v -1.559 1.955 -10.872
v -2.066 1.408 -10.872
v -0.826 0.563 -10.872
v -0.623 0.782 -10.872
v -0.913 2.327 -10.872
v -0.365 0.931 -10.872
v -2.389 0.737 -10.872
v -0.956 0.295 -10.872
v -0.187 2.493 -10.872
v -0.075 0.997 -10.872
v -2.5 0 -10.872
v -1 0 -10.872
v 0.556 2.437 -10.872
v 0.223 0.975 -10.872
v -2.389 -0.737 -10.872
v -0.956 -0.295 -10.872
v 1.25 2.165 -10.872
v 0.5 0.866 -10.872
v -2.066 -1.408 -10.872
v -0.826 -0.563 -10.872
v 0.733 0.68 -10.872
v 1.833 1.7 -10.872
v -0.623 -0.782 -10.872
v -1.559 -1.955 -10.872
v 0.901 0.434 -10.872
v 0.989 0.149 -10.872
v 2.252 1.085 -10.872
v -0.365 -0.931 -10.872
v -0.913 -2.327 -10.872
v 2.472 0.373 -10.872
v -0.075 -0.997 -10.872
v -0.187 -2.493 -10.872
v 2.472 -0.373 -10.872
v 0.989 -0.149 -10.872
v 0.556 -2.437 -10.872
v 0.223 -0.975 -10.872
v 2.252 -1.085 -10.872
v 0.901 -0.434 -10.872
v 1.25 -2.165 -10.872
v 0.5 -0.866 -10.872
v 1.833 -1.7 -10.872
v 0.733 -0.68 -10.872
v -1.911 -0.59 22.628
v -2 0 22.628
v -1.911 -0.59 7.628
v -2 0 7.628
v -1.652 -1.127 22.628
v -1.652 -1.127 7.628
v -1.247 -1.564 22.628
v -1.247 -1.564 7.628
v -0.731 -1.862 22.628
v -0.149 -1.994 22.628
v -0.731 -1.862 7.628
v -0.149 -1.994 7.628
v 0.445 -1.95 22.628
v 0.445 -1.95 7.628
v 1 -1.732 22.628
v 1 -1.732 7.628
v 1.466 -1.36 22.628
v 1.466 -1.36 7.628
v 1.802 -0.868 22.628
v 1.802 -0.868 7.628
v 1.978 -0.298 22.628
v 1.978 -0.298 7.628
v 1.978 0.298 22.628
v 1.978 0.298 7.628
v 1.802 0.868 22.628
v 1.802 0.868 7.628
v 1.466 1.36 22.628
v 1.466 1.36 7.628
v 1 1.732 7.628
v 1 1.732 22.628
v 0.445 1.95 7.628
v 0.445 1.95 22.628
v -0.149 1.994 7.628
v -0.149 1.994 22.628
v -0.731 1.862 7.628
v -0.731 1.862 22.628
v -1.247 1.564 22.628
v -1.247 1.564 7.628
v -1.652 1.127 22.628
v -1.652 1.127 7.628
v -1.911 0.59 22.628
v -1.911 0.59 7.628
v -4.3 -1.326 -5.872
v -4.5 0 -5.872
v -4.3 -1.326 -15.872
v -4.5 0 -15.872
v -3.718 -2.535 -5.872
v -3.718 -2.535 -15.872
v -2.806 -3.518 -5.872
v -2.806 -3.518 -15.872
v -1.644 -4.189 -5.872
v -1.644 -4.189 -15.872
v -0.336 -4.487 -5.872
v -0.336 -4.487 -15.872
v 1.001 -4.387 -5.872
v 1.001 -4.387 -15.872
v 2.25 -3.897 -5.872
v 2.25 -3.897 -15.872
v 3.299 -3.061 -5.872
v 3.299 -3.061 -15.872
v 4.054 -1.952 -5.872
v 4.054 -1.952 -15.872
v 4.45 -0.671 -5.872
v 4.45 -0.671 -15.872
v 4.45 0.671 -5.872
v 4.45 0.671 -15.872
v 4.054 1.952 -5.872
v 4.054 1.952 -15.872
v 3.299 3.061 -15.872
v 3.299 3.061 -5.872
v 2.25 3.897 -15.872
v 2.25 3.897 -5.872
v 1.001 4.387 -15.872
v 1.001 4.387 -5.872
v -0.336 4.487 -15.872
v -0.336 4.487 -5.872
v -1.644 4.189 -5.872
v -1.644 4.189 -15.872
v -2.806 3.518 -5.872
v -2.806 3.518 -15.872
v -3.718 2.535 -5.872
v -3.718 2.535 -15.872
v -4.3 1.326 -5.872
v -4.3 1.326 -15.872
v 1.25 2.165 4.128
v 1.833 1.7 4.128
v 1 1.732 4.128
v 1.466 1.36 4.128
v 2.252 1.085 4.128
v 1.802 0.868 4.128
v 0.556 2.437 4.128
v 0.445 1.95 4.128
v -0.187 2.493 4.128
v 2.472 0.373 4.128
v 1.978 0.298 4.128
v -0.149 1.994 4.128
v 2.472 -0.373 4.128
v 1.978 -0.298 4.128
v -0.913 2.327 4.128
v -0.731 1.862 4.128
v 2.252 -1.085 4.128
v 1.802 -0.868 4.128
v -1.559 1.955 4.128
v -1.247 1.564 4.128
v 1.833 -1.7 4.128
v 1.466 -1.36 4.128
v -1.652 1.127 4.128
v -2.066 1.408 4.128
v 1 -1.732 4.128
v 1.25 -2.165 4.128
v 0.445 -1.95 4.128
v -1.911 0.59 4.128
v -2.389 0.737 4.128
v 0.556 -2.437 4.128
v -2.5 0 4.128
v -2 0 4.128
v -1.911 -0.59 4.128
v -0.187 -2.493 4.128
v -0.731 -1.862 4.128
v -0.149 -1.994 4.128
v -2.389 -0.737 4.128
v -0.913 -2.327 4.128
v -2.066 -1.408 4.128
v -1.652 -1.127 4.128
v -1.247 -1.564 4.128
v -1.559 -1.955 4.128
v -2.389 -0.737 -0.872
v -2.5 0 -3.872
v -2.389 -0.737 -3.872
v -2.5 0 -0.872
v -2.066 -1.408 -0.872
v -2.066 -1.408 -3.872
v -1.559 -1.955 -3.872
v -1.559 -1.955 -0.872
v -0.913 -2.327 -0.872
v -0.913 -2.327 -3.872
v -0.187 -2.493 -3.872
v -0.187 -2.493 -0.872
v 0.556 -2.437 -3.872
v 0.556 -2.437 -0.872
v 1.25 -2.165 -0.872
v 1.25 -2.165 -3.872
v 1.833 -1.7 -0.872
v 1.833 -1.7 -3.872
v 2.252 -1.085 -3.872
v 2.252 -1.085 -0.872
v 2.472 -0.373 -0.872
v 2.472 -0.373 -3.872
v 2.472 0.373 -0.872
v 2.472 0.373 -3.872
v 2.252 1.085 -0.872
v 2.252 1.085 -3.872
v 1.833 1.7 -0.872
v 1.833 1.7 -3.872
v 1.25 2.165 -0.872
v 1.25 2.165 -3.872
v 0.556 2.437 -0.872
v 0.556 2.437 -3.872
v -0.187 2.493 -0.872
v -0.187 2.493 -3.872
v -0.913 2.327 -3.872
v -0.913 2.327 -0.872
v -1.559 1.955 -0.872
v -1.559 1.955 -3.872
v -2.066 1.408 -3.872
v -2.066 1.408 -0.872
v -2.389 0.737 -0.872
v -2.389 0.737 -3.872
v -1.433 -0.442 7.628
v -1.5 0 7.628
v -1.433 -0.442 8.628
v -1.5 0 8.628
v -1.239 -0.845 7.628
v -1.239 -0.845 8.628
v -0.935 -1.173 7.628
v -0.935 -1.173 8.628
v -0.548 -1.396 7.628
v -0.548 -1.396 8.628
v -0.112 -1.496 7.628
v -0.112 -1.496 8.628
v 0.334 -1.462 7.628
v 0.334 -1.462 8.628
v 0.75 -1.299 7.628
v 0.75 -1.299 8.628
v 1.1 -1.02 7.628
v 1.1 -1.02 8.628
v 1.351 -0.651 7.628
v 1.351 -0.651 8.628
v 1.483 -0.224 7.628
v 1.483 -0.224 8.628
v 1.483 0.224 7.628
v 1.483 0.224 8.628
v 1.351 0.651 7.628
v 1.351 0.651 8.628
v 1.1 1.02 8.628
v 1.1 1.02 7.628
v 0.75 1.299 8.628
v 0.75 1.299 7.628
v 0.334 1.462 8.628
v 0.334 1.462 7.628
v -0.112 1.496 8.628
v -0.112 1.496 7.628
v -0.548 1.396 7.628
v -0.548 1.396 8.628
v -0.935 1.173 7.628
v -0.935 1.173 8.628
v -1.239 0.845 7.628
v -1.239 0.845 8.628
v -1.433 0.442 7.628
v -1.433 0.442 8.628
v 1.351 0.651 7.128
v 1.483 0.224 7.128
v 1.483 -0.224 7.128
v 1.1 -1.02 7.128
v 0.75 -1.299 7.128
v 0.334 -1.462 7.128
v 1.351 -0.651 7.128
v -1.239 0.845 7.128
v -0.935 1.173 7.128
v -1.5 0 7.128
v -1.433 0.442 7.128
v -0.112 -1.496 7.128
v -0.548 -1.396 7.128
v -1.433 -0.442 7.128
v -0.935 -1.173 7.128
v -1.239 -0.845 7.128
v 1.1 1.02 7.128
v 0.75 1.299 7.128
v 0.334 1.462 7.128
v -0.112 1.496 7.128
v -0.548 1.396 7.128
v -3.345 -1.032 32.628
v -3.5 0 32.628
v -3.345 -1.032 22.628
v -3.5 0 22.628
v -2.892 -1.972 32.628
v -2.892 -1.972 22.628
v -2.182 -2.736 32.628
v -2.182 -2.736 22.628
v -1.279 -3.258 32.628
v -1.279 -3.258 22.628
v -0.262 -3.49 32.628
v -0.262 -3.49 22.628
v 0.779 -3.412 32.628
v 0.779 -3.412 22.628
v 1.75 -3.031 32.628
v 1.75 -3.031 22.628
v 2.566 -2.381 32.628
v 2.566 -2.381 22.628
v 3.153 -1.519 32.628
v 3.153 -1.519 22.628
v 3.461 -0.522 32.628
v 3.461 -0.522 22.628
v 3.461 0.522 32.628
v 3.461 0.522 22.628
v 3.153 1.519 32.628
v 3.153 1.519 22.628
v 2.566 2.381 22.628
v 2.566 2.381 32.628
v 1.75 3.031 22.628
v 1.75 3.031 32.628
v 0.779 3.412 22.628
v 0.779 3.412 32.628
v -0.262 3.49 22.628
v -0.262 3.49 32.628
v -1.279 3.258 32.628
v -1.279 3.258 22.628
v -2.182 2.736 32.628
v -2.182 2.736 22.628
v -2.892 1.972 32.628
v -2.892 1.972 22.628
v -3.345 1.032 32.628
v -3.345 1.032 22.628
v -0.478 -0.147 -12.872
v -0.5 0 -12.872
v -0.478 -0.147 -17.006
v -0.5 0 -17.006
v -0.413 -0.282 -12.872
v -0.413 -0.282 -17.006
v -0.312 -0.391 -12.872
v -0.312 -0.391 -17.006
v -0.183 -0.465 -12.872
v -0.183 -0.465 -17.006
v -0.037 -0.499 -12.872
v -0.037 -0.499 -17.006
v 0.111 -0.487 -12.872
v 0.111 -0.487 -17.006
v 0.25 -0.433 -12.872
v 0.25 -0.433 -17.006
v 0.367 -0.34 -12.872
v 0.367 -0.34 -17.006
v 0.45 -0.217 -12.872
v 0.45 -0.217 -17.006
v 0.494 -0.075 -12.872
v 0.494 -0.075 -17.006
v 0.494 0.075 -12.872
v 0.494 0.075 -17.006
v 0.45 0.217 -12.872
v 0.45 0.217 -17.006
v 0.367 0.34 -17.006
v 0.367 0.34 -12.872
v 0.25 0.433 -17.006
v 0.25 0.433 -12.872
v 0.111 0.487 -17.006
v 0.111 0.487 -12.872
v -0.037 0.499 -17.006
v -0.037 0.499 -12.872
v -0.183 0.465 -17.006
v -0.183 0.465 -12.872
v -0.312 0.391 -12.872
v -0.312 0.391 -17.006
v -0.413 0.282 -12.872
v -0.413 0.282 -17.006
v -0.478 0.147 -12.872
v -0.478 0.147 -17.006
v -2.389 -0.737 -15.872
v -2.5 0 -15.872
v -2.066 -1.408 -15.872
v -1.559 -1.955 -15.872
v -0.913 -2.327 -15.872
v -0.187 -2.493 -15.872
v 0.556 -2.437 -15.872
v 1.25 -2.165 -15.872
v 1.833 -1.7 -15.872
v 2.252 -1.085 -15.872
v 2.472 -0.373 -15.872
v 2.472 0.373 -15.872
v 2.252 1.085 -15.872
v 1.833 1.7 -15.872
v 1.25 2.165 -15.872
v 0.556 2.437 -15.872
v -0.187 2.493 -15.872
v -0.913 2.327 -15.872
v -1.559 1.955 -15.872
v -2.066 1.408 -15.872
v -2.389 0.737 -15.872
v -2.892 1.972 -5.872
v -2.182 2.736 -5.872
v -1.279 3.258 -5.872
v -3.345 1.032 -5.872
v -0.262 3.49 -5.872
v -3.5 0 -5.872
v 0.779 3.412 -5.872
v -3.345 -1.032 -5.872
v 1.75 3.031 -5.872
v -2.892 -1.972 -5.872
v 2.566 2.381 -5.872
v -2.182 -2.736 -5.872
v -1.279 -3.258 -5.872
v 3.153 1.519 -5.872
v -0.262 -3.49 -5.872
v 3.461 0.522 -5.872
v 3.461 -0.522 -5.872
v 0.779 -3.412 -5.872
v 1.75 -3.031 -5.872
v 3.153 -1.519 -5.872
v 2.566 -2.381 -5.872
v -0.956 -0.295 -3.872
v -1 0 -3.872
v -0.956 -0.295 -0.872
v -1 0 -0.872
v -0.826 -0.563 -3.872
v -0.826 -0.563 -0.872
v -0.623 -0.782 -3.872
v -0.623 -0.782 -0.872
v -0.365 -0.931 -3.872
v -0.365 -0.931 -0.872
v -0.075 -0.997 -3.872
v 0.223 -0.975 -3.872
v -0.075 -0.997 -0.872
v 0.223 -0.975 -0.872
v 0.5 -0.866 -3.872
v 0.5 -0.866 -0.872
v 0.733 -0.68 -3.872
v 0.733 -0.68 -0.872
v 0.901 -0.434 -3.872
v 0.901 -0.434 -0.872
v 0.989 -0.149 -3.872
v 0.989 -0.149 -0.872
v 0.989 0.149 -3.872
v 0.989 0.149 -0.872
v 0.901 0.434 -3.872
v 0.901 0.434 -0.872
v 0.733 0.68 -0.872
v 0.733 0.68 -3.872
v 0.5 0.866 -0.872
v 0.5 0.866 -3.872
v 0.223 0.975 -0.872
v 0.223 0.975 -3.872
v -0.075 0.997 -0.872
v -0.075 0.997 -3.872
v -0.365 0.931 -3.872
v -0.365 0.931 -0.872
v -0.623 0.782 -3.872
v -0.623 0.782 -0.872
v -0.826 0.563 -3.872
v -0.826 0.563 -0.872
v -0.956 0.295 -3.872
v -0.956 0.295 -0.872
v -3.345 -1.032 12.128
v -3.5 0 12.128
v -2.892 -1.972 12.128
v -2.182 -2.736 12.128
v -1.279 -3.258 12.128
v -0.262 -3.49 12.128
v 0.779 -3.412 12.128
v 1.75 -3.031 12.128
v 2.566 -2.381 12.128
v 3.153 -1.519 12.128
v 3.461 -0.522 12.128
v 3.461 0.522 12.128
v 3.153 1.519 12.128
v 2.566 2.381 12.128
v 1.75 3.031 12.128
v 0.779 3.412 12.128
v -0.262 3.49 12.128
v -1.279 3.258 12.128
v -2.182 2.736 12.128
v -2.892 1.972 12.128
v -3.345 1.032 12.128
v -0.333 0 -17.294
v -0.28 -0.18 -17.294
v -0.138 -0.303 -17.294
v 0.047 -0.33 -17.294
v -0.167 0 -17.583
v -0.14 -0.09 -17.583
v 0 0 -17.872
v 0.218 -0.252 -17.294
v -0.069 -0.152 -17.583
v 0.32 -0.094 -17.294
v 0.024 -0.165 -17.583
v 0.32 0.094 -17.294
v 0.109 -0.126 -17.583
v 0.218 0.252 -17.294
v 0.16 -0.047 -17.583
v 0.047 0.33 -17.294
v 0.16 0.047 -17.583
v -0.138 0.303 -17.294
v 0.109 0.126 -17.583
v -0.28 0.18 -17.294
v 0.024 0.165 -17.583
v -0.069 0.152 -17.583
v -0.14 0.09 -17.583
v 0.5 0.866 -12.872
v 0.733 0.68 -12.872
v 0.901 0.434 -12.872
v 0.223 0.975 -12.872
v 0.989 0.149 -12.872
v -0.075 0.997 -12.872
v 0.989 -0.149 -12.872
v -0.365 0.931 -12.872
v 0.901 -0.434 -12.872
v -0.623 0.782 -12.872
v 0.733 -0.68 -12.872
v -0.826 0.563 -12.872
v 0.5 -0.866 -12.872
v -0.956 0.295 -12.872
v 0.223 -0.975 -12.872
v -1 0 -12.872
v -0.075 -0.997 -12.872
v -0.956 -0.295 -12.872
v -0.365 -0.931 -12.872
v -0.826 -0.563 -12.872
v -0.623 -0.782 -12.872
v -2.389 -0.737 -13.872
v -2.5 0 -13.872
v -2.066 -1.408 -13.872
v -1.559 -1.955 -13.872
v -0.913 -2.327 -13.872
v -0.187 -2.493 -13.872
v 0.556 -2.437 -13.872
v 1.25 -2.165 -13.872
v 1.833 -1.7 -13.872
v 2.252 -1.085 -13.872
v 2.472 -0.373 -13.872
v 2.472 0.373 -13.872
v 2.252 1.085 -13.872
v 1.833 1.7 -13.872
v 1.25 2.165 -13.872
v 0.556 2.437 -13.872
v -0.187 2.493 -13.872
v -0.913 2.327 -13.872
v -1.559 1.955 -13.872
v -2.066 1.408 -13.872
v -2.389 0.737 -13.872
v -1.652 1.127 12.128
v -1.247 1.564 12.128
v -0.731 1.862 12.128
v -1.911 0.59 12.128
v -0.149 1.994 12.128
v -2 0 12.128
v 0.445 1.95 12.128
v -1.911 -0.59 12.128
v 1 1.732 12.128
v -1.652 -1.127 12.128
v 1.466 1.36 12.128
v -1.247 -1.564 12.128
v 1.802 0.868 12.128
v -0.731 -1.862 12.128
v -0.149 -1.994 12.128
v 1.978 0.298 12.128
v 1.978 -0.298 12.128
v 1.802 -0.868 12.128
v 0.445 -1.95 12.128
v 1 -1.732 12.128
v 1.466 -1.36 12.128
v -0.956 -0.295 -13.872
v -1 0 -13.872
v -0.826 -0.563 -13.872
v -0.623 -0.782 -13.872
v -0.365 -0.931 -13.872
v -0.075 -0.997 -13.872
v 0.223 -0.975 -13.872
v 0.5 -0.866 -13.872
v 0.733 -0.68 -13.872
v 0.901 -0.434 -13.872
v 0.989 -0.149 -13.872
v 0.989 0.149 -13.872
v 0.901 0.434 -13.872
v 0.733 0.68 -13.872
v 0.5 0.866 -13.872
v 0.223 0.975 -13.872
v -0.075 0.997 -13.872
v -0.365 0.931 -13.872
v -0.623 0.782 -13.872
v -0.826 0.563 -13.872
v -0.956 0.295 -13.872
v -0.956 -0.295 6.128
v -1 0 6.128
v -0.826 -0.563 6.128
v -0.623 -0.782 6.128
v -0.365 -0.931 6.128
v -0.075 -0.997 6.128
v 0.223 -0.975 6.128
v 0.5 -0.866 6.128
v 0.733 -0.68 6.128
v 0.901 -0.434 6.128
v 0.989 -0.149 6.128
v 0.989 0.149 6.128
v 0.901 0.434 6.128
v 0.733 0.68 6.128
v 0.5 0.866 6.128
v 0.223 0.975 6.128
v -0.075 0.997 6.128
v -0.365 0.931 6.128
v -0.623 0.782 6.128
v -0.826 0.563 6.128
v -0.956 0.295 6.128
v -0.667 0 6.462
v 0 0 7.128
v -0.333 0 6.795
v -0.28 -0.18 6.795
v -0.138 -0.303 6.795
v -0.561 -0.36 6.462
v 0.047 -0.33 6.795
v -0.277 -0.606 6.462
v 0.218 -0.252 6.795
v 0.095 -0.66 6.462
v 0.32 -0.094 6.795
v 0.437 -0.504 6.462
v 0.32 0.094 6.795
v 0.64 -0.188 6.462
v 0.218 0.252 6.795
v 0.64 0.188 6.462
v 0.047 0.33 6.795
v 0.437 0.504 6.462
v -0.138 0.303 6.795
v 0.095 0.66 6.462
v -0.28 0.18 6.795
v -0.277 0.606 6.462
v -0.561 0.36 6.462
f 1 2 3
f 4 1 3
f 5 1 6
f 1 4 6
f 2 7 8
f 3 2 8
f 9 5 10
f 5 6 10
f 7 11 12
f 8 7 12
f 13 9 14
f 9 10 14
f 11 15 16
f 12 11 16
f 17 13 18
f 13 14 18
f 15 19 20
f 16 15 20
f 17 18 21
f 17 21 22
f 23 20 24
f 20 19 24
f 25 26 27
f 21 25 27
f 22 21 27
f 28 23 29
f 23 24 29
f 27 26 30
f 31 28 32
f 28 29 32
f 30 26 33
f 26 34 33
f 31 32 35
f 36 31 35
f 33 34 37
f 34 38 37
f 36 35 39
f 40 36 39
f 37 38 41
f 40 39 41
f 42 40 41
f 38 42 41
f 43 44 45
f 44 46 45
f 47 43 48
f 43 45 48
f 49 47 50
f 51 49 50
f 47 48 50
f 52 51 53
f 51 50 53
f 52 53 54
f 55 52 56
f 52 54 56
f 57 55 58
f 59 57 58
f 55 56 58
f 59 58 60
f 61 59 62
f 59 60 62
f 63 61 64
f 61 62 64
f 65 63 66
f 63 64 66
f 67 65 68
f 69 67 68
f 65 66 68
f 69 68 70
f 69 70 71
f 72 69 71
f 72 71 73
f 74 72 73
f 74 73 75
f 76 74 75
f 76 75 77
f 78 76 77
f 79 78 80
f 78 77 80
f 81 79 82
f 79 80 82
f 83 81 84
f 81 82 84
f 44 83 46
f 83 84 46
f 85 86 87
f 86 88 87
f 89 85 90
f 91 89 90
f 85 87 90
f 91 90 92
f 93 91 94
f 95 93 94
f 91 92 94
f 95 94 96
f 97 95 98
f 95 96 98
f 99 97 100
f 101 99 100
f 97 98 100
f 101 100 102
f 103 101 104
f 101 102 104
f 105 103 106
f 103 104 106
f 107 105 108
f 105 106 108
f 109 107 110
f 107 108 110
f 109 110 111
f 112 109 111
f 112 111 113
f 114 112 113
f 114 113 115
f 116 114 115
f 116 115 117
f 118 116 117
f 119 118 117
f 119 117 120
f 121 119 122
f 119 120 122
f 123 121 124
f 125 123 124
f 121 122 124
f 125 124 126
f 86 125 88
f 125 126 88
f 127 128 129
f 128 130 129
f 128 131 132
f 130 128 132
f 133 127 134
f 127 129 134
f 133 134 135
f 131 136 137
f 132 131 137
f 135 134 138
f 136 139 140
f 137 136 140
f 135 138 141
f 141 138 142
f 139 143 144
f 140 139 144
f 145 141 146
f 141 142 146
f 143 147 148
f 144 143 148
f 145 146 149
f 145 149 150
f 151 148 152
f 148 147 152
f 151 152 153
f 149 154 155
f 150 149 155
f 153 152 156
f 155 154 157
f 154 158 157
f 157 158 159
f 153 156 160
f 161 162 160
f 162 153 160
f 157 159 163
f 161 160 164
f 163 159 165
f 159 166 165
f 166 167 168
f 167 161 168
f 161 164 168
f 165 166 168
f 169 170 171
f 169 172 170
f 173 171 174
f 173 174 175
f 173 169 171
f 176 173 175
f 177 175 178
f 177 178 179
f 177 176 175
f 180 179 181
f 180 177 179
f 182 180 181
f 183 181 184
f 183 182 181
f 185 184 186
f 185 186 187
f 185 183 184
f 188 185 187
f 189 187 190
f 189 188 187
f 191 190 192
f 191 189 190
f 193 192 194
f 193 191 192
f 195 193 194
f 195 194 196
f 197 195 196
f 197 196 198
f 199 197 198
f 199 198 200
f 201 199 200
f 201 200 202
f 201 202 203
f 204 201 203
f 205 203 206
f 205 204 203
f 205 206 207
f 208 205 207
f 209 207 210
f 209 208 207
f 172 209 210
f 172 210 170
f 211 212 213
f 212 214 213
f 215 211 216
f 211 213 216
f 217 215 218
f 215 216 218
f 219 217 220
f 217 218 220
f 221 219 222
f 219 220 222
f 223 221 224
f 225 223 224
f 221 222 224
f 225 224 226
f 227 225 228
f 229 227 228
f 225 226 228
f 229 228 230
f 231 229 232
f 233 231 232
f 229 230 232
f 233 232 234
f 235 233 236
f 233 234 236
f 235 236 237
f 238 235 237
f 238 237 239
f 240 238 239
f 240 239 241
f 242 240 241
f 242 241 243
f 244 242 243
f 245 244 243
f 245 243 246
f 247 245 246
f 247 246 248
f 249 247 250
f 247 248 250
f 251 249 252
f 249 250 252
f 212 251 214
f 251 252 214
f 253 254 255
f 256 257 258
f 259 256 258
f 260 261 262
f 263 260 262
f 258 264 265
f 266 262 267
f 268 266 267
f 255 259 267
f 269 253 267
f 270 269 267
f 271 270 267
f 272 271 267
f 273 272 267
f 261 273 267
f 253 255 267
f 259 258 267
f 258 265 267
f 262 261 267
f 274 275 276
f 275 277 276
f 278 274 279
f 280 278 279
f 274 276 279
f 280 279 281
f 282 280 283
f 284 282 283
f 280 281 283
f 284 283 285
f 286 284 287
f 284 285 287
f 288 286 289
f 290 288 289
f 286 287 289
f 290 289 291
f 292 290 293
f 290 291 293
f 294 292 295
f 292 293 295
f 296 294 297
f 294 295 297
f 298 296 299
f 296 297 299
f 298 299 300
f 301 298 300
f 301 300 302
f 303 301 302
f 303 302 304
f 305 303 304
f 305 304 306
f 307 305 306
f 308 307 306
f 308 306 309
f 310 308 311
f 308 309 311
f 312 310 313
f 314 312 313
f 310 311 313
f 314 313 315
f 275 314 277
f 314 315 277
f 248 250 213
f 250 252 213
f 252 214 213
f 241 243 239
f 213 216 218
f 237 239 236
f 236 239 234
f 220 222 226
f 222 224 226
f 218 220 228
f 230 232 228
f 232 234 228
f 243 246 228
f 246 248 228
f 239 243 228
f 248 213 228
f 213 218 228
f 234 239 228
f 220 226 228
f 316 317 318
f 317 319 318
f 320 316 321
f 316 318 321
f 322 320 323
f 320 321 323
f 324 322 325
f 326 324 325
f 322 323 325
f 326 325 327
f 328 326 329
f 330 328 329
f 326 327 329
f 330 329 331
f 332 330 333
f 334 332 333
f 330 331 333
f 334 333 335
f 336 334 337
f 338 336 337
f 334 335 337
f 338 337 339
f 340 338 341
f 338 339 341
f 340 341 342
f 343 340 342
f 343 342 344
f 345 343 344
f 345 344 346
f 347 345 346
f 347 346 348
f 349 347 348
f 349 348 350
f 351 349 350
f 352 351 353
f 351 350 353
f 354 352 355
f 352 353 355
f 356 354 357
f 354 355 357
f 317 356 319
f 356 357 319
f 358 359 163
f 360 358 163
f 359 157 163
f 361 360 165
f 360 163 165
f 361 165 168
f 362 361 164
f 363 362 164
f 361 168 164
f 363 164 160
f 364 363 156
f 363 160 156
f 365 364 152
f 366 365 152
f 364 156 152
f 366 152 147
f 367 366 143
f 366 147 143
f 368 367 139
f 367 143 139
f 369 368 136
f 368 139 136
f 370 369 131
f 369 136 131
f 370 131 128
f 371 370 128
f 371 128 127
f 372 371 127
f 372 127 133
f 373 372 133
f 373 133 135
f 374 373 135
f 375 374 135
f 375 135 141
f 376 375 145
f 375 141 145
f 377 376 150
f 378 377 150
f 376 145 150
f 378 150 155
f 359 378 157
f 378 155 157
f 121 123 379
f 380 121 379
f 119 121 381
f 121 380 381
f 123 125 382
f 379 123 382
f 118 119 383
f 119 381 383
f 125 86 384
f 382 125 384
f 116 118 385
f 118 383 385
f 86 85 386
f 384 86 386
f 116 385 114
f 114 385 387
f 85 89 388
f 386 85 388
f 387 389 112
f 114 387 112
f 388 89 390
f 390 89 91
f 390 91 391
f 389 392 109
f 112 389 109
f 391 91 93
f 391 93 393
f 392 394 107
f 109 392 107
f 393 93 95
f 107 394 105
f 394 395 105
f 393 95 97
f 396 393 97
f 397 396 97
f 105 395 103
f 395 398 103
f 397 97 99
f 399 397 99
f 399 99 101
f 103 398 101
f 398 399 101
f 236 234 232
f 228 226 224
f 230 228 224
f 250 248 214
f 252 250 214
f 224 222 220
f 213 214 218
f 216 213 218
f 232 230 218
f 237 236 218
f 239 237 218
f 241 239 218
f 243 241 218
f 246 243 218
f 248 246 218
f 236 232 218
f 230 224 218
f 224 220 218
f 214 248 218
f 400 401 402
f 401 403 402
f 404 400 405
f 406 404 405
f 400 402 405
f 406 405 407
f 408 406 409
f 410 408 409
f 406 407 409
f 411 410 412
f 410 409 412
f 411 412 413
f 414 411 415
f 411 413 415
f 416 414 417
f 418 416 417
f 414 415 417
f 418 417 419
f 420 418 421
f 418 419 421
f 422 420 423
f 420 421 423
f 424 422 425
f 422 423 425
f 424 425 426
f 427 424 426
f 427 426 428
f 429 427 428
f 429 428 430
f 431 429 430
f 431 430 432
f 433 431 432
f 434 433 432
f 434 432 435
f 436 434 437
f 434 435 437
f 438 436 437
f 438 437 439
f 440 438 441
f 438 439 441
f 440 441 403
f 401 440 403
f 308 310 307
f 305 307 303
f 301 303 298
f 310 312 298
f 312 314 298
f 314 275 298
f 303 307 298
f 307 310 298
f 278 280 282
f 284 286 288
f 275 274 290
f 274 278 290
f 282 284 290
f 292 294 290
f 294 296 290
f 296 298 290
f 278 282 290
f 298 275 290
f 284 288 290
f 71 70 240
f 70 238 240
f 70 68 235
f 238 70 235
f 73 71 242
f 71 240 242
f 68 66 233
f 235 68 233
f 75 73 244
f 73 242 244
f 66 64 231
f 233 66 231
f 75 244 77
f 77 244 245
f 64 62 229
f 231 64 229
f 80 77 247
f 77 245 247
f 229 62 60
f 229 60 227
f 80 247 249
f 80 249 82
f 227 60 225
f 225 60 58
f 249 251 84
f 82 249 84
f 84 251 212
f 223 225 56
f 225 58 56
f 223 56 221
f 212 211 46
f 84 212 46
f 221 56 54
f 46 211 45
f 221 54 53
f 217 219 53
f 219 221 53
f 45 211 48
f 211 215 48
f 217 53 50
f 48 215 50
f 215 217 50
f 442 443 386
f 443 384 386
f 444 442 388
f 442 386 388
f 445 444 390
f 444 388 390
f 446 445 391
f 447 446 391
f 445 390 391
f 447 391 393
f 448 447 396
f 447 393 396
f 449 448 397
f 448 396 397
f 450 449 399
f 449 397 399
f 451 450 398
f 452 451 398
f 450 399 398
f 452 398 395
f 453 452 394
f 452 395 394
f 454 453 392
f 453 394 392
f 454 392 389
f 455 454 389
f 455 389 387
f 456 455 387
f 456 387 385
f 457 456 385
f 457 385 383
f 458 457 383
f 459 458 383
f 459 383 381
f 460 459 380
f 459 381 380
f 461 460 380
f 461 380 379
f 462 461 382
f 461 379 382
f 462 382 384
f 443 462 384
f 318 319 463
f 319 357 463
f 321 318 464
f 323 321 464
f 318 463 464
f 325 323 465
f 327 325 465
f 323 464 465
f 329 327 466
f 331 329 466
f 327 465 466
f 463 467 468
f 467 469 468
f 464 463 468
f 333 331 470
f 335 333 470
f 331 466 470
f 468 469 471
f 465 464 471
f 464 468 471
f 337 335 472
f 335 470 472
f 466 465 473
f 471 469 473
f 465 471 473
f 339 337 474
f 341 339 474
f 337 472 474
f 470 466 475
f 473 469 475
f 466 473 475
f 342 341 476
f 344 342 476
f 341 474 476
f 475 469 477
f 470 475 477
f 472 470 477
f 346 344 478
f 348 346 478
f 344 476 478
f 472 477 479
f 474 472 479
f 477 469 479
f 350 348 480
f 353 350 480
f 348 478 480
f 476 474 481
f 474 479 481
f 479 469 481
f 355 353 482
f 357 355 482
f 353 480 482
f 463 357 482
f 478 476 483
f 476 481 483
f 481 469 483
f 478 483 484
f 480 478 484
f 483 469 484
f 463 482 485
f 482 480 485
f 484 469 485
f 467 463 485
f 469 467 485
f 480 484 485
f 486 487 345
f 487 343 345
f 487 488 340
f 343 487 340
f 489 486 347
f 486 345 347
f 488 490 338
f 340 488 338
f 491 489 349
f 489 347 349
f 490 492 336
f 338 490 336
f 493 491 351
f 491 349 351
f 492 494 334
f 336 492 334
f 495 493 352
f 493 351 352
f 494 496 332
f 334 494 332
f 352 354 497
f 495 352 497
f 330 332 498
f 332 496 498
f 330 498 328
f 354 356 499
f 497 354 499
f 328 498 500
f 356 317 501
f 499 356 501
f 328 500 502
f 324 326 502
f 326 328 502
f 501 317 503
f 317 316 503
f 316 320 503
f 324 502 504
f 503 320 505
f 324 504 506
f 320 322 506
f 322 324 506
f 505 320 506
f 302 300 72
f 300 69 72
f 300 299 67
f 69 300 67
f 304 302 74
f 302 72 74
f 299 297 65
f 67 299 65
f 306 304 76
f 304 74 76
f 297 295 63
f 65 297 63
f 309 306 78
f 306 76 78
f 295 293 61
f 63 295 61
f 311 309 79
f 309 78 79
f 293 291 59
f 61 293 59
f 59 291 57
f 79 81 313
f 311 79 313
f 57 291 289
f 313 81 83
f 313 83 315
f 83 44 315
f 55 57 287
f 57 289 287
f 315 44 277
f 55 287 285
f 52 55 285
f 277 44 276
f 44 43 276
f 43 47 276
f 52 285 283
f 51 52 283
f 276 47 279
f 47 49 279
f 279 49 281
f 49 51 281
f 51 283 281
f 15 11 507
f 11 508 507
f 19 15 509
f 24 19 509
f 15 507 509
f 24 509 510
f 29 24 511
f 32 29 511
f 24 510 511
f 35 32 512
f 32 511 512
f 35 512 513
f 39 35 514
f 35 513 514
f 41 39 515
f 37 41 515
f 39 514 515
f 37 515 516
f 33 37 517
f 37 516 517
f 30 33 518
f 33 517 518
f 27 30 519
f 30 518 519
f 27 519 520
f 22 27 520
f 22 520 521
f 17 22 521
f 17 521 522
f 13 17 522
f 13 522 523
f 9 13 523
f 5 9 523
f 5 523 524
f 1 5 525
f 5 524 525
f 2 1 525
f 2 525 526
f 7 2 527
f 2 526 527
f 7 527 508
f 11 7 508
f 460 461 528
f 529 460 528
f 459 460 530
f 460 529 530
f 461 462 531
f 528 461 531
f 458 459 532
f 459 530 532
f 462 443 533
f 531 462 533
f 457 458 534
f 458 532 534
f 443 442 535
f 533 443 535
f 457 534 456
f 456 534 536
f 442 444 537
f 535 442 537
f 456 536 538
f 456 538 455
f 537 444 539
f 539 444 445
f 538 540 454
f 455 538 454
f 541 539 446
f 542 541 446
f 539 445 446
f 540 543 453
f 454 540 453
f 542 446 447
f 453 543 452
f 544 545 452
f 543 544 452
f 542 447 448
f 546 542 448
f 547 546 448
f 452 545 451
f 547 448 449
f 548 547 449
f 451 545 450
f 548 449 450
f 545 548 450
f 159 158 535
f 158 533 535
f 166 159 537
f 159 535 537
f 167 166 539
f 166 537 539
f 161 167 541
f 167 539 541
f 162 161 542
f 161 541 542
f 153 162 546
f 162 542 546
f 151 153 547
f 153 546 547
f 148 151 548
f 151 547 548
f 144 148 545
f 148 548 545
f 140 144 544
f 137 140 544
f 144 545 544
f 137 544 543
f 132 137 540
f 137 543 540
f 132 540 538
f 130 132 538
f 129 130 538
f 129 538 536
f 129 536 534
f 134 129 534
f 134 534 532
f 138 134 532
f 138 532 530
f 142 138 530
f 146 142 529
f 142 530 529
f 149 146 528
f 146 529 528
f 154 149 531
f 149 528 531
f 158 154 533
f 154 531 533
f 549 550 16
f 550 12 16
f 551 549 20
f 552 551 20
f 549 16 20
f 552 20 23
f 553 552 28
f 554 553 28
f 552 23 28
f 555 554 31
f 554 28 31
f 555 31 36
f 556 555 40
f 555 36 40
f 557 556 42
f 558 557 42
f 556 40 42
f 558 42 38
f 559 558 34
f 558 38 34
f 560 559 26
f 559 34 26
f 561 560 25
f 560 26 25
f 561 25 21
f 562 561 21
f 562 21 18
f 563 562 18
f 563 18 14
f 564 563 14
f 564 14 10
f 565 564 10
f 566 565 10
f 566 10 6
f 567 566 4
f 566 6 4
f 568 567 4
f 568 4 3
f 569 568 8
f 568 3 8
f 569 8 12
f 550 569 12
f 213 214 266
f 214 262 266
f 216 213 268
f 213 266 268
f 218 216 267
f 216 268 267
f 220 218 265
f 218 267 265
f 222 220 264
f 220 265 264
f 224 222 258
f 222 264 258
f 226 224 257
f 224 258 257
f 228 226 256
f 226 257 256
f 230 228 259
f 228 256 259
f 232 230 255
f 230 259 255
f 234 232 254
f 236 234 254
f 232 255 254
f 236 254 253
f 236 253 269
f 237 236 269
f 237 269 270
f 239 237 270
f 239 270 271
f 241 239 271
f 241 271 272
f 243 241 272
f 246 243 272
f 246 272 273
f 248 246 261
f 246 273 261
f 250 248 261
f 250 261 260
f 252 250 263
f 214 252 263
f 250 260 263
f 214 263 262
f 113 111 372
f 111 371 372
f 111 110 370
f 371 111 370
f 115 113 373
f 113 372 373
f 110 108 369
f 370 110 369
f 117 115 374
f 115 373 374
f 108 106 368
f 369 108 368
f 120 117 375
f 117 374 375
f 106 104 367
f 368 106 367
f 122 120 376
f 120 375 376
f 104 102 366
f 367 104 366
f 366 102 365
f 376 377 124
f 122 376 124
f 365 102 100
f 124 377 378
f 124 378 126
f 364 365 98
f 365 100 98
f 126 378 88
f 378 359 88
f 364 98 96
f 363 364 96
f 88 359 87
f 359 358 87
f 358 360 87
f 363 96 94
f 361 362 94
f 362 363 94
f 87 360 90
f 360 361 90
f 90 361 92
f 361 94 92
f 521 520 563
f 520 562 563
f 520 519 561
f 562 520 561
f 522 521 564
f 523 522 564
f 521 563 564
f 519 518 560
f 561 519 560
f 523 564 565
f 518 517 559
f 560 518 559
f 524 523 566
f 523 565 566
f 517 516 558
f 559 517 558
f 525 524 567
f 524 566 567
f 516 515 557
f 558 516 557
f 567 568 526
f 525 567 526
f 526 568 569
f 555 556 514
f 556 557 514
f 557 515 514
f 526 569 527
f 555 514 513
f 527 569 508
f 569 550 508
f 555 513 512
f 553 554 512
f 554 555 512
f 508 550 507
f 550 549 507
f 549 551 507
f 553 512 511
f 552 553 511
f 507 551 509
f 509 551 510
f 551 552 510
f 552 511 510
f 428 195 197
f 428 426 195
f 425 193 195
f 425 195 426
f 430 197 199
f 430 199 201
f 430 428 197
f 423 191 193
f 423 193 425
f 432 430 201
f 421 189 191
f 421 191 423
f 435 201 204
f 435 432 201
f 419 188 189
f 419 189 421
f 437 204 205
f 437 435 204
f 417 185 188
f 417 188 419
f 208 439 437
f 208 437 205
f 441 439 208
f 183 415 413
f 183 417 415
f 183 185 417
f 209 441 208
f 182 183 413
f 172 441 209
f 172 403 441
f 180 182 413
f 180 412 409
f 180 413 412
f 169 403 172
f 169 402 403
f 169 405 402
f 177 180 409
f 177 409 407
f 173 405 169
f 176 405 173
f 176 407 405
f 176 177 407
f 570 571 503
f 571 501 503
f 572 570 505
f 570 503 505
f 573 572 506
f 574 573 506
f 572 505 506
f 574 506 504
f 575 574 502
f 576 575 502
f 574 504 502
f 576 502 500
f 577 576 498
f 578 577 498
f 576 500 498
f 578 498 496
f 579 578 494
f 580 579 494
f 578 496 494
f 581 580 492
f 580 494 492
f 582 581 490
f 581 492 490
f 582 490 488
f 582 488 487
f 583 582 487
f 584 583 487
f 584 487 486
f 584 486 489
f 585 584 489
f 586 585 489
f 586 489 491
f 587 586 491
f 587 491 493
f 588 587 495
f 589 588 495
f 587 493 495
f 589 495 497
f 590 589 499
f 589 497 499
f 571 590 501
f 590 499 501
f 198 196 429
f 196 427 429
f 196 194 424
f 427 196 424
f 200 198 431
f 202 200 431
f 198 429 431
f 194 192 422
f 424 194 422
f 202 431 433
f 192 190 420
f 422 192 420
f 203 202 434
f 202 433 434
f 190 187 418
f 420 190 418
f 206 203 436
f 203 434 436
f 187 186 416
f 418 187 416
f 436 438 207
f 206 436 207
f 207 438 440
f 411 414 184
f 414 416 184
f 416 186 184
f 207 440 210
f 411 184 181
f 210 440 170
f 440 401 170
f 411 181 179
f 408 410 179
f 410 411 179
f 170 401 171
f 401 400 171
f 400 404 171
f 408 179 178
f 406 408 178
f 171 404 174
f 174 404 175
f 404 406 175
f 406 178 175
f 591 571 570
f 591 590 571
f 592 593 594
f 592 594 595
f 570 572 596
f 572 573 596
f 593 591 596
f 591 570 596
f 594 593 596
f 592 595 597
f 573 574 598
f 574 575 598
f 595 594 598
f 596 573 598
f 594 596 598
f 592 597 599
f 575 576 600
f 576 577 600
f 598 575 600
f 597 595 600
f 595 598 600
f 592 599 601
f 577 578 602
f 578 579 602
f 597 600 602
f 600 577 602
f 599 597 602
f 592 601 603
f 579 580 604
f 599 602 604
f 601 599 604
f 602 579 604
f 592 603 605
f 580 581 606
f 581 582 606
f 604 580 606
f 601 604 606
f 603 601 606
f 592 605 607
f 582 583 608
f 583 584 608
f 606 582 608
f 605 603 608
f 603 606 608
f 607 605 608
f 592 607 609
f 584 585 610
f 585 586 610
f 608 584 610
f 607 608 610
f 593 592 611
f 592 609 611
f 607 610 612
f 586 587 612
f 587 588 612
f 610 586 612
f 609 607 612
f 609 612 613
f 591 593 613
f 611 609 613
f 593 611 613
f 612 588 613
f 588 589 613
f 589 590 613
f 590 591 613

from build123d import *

# Parameters (mm, degrees)
F0_W = 1.5
F0_H = 3


with BuildPart() as f1:
    # F0 (on Front) → F1 (revolve)
    with BuildSketch(Plane.XZ):
        Polygon((0, -17.871598), (0, 7.128402), (-1, 6.128402), (-1, -0.871598), (-1, -3.871598), (-1, -10.871598), (-1, -12.871598), (-0.5, -12.871598), (-0.5, -17.005572), align=None)
    revolve(axis=Axis((0, 0, 8.628402), (0, 0, 1)))


with BuildPart() as f2:
    # F0 (on Front) → F2 (revolve)
    with BuildSketch(Plane.XZ):
        with Locations((-1.75, -2.371598)):
            Rectangle(F0_W, F0_H)
        Polygon((-1, -12.871598), (-1, -10.871598), (-2.5, -10.871598), (-2.5, -13.871598), (-1, -13.871598), align=None)
    revolve(axis=Axis((0, 0, -5.371598), (0, 0, 1)))


with BuildPart() as f3:
    # F0 (on Front) → F3 (revolve)
    with BuildSketch(Plane.XZ):
        Polygon((-1.5, 7.128402), (0, 7.128402), (0, 8.628402), (-1.5, 8.628402), (-1.5, 7.628402), align=None)
    revolve(axis=Axis((0, 0, -5.371598), (0, 0, 1)))


with BuildPart() as f4:
    # F0 (on Front) → F4 (revolve)
    with BuildSketch(Plane.XZ):
        Polygon((-1.5, 8.628402), (0, 8.628402), (0, 32.628402), (-3.5, 32.628402), (-3.5, 22.628402), (-2, 22.628402), (-2, 12.128402), (-2, 7.628402), (-1.5, 7.628402), align=None)
    revolve(axis=Axis((0, 0, 8.628402), (0, 0, 1)))


with BuildPart() as f5:
    # F0 (on Front) → F5 (revolve)
    with BuildSketch(Plane.XZ):
        Polygon((-2.5, -3.871598), (-2.5, -0.871598), (-2.5, 4.128402), (-2, 4.128402), (-2, 7.628402), (-2, 12.128402), (-3.5, 12.128402), (-3.5, -5.871598), (-4.5, -5.871598), (-4.5, -15.871598), (-2.5, -15.871598), (-2.5, -13.871598), (-2.5, -10.871598), align=None)
    revolve(axis=Axis((0, 0, -5.371598), (0, 0, 1)))


solid = Compound([f1.part, f2.part, f3.part, f4.part, f5.part])
